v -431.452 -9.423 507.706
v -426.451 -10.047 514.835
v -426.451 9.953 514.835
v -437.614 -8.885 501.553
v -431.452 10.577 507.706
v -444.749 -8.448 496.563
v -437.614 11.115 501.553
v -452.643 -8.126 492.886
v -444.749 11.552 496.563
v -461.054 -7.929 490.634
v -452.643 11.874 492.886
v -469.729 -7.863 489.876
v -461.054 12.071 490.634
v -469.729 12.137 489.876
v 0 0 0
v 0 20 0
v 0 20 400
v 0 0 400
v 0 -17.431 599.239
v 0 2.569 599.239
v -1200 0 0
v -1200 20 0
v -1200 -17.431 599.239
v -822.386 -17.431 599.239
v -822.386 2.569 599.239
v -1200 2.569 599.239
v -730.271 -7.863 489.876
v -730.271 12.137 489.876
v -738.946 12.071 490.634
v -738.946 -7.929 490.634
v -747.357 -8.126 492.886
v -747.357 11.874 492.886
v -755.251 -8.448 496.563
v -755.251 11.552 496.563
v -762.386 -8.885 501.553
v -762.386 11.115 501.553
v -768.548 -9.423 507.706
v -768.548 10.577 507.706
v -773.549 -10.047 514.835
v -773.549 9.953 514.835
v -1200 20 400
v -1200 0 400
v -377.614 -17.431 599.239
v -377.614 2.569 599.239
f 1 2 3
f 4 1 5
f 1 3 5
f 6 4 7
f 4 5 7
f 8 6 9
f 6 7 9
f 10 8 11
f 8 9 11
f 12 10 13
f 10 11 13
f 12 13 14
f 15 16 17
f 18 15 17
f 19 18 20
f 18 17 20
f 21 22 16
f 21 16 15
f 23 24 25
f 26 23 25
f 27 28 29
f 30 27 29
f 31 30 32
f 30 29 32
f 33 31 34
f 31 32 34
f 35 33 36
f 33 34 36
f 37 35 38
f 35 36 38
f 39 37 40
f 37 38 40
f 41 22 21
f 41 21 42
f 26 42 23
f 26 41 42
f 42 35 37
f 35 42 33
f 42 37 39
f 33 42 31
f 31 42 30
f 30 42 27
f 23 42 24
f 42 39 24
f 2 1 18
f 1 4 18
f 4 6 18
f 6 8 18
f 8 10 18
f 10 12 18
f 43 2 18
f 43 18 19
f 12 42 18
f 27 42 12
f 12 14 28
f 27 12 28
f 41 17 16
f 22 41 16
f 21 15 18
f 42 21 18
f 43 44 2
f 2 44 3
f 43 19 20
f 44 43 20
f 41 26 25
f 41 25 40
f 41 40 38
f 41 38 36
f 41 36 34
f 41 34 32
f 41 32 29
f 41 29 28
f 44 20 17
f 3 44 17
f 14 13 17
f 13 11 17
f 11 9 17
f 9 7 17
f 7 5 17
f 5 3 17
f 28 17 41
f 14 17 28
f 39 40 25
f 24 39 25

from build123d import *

# Parameters (mm, degrees)
EXTRUDE_1_DEPTH     = 1200
CUT_EXTRUDE_1_DEPTH = 38.43114855


with BuildPart() as part:
    # Эскиз2 → Бобышка-Вытянуть1 (new body)
    with BuildSketch(Plane(origin=(0, 0, 0), x_dir=(0, 0, -1), z_dir=(1, 0, 0))):
        Polygon((0, 20), (0, 0), (-400, 0), (-599.238939618, -17.43114855), (-599.238939618, 2.56885145), (-400, 20), align=None)
    extrude(amount=-EXTRUDE_1_DEPTH)

    # Эскиз3 → Вырез-Вытянуть1 (cut, through all)
    with BuildSketch(Plane(origin=(0, 20, 0), x_dir=(1, 0, 0), z_dir=(0, 1, 0))):
        with BuildLine():
            Line((-822.385668675, -599.238939618), (-377.614331325, -599.238939618))
            Line((-377.614331325, -599.238939618), (-426.451140145, -514.835069456))
            ThreePointArc((-426.451140145, -514.835069456), (-444.74923451, -496.562846761), (-469.728809412, -489.875902964))
            Line((-469.728809412, -489.875902964), (-730.271190588, -489.875902964))
            ThreePointArc((-730.271190588, -489.875902964), (-755.25076549, -496.562846761), (-773.548859855, -514.835069456))
            Line((-773.548859855, -514.835069456), (-822.385668675, -599.238939618))
        make_face()
    extrude(amount=-CUT_EXTRUDE_1_DEPTH, mode=Mode.SUBTRACT)


solid = part.part
